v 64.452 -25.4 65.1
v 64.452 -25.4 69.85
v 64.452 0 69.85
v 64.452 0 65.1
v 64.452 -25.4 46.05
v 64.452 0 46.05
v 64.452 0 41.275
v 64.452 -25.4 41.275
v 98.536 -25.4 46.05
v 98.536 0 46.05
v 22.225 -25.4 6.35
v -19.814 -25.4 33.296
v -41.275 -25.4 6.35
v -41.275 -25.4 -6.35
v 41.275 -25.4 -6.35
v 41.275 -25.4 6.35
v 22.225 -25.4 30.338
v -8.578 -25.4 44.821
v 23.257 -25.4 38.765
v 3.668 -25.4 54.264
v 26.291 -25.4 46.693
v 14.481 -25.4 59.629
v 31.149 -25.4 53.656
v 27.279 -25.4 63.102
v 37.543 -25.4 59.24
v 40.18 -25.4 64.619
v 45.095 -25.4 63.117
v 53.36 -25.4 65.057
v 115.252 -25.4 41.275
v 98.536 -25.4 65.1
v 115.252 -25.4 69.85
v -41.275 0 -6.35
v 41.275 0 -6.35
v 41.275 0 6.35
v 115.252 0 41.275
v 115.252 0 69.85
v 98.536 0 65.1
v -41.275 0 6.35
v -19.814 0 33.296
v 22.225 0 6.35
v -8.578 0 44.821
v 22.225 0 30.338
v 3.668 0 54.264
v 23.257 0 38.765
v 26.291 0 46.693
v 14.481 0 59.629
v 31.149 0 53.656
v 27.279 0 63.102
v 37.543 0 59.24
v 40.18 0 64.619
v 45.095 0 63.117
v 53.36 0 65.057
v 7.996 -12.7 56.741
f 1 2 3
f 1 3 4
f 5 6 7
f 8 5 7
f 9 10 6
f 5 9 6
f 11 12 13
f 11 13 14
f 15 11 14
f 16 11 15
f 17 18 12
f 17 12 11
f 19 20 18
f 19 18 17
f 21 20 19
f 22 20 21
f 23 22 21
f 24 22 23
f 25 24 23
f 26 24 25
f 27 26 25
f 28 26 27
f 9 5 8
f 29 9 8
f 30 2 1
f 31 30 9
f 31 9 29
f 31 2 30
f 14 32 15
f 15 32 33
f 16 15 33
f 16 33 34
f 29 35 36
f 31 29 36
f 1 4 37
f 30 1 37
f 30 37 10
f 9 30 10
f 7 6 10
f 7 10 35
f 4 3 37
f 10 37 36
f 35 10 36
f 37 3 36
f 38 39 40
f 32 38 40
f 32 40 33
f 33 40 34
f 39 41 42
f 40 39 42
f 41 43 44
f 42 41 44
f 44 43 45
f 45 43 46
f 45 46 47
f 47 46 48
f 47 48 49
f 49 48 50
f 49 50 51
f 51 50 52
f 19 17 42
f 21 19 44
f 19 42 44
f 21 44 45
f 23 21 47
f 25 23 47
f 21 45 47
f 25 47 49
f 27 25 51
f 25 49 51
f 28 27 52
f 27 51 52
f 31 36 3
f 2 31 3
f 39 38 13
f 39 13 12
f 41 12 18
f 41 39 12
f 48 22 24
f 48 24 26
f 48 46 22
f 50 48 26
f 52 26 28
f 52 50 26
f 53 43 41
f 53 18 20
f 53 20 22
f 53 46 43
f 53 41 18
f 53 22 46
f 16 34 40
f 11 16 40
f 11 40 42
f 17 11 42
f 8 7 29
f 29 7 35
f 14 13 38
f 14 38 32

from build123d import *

# Parameters (mm, degrees)
F1_DEPTH = 25.4


with BuildPart() as f1:
    # F0 (on Front) → F1 (new body)
    with BuildSketch(Plane.XZ):
        Polygon((-41.275, -6.35), (41.275, -6.35), (41.275, 6.35), (22.225, 6.35), (-41.275, 6.35), align=None)
        with BuildLine():
            add(Edge.make_bspline(
                [(-41.275, 6.35), (-25.7957625049, 26.7914881612), (1.4845995339, 62.8172418731), (37.5652658057, 64.8833178289), (53.3598609175, 65.0570964203)],
                knots=[0, 0, 0, 0, 0.5376939005, 0.9476231808, 0.9476231808, 0.9476231808, 0.9476231808], degree=3))
            Line((-41.275, 6.35), (22.225, 6.35))
            Line((22.225, 6.35), (22.225, 30.3383627058))
            ThreePointArc((22.225, 30.3383627058), (31.1487862547, 53.6555775646), (53.3598609175, 65.0570964203))
        make_face()
    extrude(amount=F1_DEPTH)


with BuildPart() as f1b:
    # F0 (on Front) → F1, piece 2 (new body)
    with BuildSketch(Plane.XZ):
        Polygon((98.536185044, 46.0502), (64.4524941912, 46.0502), (64.4524941912, 41.275), (115.2524941912, 41.275), (115.2524941912, 69.85), (64.4524941912, 69.85), (64.4524941912, 65.1002), (98.536185044, 65.1002), align=None)
    extrude(amount=F1_DEPTH)


solid = Compound([f1.part, f1b.part])
